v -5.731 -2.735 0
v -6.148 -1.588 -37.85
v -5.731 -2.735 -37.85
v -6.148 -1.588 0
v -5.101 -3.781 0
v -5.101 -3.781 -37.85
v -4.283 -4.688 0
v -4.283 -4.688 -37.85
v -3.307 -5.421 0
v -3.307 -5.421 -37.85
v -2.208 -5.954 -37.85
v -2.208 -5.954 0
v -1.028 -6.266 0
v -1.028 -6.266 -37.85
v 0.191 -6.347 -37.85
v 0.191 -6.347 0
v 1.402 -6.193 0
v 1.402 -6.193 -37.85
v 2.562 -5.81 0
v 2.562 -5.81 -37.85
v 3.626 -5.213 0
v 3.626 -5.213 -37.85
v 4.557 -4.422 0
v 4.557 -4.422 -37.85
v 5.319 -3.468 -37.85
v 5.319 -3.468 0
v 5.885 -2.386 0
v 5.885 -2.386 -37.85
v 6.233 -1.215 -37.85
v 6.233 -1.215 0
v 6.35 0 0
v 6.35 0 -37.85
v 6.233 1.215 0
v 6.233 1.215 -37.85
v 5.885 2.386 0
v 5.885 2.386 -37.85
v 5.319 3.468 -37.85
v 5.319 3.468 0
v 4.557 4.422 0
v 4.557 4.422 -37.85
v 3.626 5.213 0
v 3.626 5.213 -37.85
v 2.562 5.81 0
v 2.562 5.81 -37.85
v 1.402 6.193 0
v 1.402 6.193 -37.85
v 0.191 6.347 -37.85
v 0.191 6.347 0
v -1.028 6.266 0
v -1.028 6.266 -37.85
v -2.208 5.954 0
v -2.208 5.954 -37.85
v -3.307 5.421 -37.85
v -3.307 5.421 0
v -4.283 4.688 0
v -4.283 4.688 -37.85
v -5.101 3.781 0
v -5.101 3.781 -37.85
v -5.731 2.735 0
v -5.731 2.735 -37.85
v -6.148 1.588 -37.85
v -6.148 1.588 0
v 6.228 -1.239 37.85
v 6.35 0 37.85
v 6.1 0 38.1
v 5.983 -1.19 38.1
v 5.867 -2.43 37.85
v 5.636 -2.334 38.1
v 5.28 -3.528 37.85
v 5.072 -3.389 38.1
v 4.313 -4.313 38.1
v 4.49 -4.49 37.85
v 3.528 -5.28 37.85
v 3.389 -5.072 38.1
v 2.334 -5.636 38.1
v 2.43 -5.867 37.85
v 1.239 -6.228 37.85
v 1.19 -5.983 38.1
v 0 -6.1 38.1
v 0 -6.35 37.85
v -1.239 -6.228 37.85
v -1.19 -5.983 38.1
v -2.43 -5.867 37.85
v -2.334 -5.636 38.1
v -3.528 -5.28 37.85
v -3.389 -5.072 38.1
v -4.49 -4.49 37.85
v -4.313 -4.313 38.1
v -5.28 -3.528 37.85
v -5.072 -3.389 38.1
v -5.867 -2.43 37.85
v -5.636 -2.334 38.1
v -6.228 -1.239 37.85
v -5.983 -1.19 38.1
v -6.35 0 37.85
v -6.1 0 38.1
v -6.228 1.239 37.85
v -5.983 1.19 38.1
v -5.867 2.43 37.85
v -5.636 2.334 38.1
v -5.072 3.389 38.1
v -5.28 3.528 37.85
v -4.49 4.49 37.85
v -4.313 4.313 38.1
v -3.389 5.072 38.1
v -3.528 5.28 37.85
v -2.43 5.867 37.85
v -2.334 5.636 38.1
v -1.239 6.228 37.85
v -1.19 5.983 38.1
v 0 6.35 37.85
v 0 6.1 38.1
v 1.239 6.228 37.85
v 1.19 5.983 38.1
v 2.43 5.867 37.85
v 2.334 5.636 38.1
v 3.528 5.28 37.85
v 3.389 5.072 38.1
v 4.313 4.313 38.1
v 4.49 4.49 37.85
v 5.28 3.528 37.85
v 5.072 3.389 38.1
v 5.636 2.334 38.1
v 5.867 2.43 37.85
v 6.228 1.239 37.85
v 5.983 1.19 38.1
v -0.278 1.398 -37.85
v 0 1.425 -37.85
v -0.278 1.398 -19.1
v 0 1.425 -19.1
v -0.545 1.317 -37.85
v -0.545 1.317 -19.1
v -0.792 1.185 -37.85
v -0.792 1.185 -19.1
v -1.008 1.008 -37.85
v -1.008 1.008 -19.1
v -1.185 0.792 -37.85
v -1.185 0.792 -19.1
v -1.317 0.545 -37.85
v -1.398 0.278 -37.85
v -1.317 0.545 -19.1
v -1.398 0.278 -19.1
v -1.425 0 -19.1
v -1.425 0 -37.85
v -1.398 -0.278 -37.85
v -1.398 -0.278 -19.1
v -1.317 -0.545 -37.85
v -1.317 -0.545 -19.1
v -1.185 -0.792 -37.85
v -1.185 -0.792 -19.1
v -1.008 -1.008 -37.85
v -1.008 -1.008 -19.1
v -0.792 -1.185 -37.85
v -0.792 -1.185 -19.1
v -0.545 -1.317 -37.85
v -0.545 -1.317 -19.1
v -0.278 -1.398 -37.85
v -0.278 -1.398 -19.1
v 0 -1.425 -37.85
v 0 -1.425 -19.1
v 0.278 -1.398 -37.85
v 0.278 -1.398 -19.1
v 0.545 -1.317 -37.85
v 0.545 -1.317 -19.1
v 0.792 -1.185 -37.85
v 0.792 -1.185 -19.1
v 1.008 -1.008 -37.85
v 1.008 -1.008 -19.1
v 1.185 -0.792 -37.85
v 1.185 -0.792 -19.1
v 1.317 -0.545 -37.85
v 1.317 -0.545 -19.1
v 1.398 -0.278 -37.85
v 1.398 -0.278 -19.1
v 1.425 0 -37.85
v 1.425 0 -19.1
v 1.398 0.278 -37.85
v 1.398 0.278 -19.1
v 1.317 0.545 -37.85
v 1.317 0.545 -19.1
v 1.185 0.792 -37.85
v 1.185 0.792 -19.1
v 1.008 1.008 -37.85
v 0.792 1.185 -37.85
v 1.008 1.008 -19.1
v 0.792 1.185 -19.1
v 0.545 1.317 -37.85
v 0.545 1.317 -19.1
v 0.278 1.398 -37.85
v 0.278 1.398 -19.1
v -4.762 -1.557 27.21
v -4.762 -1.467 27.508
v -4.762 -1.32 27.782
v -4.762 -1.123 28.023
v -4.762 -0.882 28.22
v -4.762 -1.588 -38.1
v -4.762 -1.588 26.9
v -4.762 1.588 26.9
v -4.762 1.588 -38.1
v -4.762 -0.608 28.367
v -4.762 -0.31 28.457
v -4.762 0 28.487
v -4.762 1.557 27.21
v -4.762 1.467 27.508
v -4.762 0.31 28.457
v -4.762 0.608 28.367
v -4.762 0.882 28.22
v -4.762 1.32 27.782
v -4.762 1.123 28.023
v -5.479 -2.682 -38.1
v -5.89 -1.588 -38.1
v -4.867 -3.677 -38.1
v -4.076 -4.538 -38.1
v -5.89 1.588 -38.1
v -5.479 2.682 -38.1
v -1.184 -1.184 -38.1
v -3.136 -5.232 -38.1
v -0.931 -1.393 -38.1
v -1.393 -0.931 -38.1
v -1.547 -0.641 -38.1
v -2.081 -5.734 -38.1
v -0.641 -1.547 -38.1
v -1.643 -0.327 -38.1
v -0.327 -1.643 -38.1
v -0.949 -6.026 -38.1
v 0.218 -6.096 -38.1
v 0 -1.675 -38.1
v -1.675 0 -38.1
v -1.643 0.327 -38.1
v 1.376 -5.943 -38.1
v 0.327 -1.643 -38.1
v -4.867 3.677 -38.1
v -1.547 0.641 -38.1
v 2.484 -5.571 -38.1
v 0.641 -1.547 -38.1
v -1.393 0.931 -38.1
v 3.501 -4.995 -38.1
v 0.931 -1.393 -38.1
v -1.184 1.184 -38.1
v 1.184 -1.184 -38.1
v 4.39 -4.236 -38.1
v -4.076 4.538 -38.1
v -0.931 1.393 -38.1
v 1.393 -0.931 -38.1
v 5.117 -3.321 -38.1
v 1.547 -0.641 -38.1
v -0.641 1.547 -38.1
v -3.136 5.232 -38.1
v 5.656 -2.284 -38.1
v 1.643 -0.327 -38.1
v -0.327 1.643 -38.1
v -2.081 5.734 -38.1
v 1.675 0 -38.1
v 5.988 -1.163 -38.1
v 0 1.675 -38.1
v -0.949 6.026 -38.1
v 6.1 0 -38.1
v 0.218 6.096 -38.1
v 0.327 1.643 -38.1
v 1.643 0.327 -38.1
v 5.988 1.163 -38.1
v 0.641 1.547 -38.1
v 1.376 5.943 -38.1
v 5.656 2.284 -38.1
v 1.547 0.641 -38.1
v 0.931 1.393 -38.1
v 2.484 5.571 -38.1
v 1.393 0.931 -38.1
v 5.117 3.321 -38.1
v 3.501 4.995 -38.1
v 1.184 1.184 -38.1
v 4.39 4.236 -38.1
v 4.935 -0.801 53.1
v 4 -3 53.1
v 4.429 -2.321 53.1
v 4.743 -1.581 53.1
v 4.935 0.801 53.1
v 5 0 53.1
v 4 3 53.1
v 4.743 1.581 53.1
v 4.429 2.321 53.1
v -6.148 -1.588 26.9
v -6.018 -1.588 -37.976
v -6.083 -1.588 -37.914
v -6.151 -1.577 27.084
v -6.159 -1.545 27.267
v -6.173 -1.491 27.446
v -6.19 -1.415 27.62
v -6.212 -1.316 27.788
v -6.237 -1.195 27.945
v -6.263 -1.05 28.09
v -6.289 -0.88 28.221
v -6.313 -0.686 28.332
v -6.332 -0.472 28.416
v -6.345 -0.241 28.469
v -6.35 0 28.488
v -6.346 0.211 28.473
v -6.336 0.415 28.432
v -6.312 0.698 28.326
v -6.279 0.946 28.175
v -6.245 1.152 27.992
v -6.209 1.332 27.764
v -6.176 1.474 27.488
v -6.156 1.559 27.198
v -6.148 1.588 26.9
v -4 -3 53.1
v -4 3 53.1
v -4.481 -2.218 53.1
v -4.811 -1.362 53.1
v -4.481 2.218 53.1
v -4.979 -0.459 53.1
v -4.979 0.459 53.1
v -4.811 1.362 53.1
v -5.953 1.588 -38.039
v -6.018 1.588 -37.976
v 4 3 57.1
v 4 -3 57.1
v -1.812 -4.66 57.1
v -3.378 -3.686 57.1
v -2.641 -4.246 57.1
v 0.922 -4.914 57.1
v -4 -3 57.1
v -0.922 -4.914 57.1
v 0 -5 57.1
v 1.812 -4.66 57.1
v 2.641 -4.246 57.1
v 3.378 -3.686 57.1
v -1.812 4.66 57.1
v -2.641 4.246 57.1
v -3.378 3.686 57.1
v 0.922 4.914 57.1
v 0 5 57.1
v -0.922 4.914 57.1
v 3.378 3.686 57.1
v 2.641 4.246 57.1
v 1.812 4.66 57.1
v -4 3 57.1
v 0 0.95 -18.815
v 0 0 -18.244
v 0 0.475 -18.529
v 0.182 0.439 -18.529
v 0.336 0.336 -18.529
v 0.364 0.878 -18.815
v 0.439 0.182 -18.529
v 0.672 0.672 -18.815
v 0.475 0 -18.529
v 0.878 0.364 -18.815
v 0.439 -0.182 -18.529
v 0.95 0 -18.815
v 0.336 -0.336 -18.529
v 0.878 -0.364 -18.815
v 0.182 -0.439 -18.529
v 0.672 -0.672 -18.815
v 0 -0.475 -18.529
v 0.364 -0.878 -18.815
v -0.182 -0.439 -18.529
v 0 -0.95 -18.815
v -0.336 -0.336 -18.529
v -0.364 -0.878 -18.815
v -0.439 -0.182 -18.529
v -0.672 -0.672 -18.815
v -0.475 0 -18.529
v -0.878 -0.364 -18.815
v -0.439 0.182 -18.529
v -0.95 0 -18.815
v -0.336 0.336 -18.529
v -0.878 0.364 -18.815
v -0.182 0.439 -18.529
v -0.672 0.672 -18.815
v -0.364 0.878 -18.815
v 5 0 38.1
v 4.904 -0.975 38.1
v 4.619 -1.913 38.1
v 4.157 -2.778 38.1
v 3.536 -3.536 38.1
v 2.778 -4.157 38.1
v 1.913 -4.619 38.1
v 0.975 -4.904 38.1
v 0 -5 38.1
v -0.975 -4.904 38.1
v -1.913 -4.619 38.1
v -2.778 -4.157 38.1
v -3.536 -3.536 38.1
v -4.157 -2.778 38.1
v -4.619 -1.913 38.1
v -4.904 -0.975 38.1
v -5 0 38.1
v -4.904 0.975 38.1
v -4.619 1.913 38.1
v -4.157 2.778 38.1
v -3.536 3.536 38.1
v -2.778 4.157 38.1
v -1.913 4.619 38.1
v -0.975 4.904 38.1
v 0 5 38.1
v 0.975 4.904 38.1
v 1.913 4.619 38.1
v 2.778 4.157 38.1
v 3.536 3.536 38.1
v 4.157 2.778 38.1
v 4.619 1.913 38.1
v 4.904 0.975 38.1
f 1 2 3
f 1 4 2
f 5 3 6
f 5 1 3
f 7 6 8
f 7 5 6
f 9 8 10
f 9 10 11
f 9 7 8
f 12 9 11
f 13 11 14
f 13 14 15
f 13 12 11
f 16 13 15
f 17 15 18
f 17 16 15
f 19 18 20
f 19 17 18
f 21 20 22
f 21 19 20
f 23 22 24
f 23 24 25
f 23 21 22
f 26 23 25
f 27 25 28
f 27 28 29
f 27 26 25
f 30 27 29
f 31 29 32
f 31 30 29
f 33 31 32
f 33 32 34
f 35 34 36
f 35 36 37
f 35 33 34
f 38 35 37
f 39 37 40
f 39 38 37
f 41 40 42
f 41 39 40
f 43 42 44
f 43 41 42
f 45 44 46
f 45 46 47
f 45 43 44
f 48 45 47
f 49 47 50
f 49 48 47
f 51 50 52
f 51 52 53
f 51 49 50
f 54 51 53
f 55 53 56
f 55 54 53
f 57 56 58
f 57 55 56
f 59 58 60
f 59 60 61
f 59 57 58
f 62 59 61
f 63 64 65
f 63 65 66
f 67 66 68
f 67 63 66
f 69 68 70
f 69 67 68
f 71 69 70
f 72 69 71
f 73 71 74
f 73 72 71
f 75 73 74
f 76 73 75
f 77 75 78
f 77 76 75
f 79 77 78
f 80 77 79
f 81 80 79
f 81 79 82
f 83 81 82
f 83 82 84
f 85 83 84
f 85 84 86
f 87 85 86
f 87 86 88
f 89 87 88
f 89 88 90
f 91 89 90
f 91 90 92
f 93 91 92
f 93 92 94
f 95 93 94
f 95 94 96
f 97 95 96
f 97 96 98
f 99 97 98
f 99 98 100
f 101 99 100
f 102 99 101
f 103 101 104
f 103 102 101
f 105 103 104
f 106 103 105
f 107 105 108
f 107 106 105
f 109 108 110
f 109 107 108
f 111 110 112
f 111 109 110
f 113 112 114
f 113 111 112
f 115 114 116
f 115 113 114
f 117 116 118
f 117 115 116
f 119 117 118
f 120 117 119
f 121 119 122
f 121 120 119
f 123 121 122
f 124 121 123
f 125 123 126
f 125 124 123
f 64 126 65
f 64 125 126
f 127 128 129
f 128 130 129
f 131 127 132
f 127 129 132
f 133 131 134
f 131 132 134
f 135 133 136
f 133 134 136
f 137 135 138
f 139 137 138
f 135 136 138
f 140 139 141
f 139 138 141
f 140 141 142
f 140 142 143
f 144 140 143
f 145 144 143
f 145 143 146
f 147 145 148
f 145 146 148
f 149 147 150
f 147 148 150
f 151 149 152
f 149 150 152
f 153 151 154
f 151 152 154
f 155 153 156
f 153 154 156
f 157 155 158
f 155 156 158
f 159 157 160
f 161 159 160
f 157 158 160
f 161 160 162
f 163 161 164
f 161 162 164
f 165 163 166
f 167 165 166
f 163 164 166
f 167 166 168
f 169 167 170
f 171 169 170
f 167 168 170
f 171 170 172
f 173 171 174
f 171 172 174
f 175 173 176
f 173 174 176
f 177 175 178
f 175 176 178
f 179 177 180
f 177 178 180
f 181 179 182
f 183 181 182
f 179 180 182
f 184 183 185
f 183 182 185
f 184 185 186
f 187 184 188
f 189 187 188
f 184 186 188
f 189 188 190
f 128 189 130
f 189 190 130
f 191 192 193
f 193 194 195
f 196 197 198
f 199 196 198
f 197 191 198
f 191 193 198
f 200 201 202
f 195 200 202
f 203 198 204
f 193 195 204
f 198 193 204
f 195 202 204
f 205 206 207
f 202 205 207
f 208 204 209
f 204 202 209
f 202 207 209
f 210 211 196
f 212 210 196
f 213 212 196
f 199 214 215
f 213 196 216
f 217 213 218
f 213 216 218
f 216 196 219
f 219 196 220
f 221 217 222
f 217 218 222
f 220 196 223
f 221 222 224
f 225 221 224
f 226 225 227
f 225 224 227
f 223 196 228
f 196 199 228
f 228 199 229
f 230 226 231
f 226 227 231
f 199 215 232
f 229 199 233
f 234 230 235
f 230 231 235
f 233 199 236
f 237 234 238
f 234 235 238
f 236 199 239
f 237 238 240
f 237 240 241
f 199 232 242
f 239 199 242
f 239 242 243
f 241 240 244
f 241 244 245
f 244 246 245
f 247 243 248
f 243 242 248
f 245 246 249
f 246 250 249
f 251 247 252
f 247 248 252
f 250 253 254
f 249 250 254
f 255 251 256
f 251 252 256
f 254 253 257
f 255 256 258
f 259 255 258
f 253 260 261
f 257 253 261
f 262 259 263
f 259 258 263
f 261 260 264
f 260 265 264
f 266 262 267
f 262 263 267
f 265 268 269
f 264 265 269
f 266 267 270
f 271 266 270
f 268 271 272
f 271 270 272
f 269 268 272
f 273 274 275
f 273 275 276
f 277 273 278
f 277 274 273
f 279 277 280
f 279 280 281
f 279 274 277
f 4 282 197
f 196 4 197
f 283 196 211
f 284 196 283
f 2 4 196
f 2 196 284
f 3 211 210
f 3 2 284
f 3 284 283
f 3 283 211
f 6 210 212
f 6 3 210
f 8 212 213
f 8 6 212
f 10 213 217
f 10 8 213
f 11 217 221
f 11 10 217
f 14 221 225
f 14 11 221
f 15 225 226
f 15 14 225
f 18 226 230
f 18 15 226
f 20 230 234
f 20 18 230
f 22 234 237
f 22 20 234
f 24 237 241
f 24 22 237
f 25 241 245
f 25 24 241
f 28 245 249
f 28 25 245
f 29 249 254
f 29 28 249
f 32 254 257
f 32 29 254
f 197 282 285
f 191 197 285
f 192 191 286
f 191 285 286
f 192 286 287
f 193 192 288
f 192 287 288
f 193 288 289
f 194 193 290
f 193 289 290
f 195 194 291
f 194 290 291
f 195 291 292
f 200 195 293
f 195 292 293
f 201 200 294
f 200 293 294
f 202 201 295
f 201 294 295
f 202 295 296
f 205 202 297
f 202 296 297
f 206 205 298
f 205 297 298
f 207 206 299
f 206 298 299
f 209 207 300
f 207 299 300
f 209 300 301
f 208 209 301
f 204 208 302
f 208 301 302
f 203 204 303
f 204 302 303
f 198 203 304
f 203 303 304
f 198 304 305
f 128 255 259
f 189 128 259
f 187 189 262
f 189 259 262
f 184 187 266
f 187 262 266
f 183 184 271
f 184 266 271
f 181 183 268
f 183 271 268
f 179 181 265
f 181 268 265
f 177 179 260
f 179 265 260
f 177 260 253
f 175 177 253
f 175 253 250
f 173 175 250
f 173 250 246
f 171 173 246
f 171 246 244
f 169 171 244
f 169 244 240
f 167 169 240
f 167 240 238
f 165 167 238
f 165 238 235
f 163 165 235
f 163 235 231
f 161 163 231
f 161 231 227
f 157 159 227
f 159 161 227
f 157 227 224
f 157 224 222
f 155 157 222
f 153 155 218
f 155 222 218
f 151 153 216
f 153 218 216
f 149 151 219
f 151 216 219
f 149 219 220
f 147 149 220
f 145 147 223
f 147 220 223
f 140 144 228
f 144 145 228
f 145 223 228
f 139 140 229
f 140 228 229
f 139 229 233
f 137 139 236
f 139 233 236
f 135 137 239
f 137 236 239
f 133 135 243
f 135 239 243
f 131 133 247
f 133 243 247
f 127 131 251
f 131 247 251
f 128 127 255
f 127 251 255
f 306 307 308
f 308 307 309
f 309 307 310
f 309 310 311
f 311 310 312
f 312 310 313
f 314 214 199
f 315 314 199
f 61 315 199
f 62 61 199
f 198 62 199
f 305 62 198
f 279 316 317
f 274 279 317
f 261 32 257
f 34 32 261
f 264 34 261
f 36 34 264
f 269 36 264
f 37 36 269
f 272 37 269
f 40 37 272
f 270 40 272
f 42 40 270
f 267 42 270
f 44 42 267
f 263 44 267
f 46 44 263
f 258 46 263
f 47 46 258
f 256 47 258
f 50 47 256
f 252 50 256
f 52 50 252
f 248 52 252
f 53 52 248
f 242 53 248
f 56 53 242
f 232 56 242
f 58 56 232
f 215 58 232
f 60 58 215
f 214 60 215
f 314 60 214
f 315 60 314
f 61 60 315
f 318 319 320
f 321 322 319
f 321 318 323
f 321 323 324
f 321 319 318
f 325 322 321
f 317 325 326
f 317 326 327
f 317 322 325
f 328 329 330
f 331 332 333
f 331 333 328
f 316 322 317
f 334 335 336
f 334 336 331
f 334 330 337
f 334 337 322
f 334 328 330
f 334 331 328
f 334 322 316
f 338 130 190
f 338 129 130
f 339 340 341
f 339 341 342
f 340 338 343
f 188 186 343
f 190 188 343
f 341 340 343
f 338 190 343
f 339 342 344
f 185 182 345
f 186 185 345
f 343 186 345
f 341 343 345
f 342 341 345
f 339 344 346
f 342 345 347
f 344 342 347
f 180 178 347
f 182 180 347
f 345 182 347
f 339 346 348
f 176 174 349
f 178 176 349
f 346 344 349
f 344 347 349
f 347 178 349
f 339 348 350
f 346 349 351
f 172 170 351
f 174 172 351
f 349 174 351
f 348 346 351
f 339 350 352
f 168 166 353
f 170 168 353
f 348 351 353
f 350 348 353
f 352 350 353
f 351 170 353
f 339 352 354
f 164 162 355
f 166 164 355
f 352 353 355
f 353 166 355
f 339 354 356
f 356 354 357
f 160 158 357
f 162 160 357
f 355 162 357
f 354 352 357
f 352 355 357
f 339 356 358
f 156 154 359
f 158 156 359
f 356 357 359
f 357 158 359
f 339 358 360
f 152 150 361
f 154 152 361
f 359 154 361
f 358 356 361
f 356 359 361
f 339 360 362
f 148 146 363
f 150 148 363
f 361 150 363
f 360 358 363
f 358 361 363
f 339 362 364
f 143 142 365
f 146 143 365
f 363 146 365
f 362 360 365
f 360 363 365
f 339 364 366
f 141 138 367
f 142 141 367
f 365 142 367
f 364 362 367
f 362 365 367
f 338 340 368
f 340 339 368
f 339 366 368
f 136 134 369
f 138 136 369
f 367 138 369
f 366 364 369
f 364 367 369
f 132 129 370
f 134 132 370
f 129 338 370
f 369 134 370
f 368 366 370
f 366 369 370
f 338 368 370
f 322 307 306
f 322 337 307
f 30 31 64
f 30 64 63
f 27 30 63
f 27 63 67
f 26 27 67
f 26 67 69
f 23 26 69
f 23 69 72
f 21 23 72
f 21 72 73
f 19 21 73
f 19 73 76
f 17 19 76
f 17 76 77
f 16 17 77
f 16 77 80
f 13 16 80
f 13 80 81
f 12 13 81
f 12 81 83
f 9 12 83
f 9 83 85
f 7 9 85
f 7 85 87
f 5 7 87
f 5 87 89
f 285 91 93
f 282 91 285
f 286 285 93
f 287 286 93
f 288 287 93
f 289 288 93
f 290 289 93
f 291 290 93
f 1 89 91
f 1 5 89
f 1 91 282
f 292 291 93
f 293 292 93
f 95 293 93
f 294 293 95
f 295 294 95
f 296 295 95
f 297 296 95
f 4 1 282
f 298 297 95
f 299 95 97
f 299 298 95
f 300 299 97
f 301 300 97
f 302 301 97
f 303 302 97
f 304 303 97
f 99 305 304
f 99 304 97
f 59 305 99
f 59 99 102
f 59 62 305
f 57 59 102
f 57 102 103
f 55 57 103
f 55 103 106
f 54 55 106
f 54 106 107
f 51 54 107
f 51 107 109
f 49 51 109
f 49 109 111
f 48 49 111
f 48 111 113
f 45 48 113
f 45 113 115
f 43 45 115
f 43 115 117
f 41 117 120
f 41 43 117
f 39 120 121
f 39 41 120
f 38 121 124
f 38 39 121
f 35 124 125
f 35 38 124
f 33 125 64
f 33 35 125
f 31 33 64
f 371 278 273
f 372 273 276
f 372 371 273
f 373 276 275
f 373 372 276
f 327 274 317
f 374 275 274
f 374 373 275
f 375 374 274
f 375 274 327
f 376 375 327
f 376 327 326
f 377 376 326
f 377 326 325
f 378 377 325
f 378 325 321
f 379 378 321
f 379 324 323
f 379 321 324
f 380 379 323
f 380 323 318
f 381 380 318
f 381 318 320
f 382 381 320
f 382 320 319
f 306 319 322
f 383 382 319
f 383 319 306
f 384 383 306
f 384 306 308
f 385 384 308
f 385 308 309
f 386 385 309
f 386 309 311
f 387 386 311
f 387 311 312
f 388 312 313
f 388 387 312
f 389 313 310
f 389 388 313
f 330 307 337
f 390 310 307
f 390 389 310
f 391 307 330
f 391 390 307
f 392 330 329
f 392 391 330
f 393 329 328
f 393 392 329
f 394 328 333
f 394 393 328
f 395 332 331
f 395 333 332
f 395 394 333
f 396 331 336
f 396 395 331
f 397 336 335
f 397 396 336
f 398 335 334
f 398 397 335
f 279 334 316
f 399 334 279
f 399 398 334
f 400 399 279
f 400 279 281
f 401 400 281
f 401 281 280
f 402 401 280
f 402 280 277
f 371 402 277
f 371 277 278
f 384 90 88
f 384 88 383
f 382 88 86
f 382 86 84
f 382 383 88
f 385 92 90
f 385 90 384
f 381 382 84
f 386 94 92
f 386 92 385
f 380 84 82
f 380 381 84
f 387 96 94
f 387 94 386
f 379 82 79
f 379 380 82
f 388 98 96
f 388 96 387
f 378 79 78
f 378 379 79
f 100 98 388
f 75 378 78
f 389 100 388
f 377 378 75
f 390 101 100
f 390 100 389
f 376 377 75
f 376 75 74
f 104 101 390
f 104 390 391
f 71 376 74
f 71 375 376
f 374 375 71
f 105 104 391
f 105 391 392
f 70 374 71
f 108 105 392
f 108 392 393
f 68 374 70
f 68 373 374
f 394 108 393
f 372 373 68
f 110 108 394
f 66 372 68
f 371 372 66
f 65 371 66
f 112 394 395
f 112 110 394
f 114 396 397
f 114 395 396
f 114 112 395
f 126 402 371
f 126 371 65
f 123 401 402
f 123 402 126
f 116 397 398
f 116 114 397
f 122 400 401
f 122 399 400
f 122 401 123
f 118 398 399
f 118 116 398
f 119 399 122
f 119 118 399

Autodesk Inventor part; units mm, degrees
ref_plane "YZ Plane" through (0, 0, 0) normal (1, 0, 0) x (0, 1, 0)
ref_plane "XZ Plane" through (0, 0, 0) normal (0, 1, 0) x (-1, 0, 0)
sketch "Sketch1" plane through (0, 0, 0) normal (0, 0, 1) x (1, 0, 0)
  circle A0 centre (0, 0) radius 6.35
  dimension "d0" = 12.7
extrude "Extrusion1" add sketch "Sketch1" along normal mid plane 76.2
sketch "Sketch2" plane through (0, 0, 38.1) normal (0, 0, 1) x (1, 0, 0)
  circle A0 centre (0, 0) radius 6.35 projected
  circle A1 centre (0, 0) radius 5
  dimension "d3" = 10
extrude "Extrusion2" add sketch "Sketch2" along normal blind 19 contours A1
sketch "Sketch3" plane through (0, 0, 57.1) normal (0, 0, 1) x (1, 0, 0)
  circle A0 centre (0, 0) radius 5 projected
  line L0 (-4, 3) -> (-4, -3)
  line L1 (4, 3) -> (4, -3)
  line L2 (4, 0) -> (5, 0) construction
  line L3 (-4, 0) -> (-5, 0) construction
  dimension "d7" = 8
extrude "Extrusion3" cut sketch "Sketch3" against normal blind 4 contours A0 L1 | L0 A0
sketch "Sketch4" plane through (0, 0, -38.1) normal (0, 0, -1) x (-1, 0, 0)
  circle A0 centre (0, 0) radius 6.35 projected
hole "Hole1" at (0, 0, -38.1) direction (0, 0, 1) diameter 2.85 depth 19 tip angle 118 thread size "M3.5x0.6" class "6H" standard "ANSI Metric M Profile"
chamfer "Chamfer1" distance 0.25 angle 45 3 edges at (0, -1.425, -38.1) (-6.35, 0, -38.1) (-6.35, 0, 38.1)
ref_plane "Work Plane1" through (-6.35, 0, 0) normal (1, 0, 0) x (0, 1, 0)
sketch "Sketch5" plane through (-6.35, 0, 0) normal (1, 0, 0) x (0, 1, 0)
  line L0 (6.1, -38.1) -> (-6.1, -38.1) projected
  line L1 (0, -38.1) -> (0, 22.7756) construction
  arc A0 (1.5875, 26.9) -> (-1.5875, 26.9) centre (0, 26.9) ccw
  line L2 (1.5875, -38.1) -> (1.5875, 26.9)
  line L3 (-1.5875, 26.9) -> (-1.5875, -38.1)
  dimension "d20" = 3.175
  dimension "d25" = 65
extrude "Extrusion4" cut sketch "Sketch5" along normal blind 1.5875
properties part number "BB1-Axle" material "Steel, Mild"
